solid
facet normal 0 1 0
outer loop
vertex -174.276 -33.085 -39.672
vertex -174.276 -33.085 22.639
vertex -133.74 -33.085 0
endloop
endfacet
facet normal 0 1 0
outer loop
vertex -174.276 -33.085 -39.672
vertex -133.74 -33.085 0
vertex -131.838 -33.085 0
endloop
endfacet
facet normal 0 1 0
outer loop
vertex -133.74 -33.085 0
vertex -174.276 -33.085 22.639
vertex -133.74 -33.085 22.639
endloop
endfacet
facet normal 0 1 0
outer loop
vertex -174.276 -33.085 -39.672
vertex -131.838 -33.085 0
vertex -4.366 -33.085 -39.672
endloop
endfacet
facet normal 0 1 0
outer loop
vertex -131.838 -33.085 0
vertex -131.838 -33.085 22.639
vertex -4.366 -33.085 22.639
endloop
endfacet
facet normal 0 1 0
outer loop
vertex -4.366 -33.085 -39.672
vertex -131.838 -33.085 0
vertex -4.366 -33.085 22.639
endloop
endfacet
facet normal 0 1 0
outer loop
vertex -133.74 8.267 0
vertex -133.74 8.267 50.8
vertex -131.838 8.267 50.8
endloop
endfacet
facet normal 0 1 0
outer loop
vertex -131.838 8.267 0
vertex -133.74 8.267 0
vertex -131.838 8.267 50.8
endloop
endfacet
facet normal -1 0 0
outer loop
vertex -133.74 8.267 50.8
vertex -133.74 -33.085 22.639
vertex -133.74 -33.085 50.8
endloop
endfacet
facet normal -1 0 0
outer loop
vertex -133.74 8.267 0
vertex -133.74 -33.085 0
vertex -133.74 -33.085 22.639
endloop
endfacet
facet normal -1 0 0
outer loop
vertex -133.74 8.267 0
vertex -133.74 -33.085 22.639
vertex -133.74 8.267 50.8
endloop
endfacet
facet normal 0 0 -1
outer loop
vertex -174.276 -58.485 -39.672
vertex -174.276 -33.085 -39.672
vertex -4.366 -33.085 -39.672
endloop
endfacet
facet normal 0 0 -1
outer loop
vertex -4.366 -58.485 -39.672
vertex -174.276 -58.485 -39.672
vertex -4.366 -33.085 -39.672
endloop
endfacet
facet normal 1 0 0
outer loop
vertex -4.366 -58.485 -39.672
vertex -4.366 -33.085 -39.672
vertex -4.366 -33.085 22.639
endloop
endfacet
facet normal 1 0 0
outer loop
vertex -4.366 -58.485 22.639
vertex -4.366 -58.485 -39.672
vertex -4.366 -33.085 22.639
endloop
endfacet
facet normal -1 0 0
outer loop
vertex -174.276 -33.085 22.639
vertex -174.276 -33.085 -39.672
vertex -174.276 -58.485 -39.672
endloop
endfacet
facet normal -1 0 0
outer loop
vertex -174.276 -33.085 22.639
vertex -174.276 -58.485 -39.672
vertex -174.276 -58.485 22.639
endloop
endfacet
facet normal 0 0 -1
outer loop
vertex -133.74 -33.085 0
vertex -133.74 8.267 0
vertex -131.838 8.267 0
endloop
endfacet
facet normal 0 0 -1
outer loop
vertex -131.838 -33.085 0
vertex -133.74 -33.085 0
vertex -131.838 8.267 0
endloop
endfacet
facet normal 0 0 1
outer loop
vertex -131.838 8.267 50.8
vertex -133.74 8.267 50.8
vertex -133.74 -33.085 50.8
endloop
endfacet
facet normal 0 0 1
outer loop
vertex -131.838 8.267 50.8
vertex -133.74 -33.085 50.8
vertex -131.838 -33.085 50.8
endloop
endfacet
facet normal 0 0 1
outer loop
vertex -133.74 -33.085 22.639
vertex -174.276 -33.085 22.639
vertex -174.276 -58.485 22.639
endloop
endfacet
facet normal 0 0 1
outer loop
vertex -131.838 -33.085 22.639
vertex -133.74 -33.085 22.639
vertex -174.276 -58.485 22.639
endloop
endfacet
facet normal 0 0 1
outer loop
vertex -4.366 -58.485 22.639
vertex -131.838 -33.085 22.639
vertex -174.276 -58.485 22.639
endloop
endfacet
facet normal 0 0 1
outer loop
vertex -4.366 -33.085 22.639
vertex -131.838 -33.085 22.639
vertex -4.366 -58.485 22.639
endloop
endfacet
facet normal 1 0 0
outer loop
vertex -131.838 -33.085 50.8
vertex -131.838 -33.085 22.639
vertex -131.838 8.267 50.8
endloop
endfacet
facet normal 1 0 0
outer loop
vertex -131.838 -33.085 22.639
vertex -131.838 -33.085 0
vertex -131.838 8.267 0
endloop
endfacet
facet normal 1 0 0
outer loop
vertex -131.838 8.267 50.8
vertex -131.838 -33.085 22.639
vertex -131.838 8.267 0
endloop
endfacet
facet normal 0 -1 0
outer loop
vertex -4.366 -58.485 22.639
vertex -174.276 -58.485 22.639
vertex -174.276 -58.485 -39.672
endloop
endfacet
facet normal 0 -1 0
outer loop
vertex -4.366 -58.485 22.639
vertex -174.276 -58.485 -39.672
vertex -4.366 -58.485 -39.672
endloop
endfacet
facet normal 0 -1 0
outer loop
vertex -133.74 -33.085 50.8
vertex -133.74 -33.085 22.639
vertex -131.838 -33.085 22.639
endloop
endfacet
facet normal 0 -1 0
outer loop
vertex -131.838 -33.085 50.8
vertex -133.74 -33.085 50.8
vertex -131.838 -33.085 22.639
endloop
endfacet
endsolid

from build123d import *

# Parameters (mm, degrees)
F0_W     = 1.902476
F0_H     = 41.352222
F1_DEPTH = 50.8
F2_T     = -101.6
F3_W     = 169.909547
F3_H     = 62.310902
F4_DEPTH = 25.4


with BuildPart() as f1:
    # F0 (on Top) → F1 (new body)
    with BuildSketch(Plane.XY):
        with Locations((-132.789068, -12.408881)):
            Rectangle(F0_W, F0_H)
    extrude(amount=F1_DEPTH)

    # F2
    f2_openings = [f1.faces().sort_by_distance(p)[0] for p in [
        (-131.83783, -12.408881, 25.4),
    ]]
    offset(amount=F2_T, openings=f2_openings)

    # F3 (on face) → F4 (join)
    with BuildSketch(Plane.XZ.offset(33.084992)):
        with Locations((-89.321027, -8.516186)):
            Rectangle(F3_W, F3_H)
    extrude(amount=F4_DEPTH)


solid = f1.part
